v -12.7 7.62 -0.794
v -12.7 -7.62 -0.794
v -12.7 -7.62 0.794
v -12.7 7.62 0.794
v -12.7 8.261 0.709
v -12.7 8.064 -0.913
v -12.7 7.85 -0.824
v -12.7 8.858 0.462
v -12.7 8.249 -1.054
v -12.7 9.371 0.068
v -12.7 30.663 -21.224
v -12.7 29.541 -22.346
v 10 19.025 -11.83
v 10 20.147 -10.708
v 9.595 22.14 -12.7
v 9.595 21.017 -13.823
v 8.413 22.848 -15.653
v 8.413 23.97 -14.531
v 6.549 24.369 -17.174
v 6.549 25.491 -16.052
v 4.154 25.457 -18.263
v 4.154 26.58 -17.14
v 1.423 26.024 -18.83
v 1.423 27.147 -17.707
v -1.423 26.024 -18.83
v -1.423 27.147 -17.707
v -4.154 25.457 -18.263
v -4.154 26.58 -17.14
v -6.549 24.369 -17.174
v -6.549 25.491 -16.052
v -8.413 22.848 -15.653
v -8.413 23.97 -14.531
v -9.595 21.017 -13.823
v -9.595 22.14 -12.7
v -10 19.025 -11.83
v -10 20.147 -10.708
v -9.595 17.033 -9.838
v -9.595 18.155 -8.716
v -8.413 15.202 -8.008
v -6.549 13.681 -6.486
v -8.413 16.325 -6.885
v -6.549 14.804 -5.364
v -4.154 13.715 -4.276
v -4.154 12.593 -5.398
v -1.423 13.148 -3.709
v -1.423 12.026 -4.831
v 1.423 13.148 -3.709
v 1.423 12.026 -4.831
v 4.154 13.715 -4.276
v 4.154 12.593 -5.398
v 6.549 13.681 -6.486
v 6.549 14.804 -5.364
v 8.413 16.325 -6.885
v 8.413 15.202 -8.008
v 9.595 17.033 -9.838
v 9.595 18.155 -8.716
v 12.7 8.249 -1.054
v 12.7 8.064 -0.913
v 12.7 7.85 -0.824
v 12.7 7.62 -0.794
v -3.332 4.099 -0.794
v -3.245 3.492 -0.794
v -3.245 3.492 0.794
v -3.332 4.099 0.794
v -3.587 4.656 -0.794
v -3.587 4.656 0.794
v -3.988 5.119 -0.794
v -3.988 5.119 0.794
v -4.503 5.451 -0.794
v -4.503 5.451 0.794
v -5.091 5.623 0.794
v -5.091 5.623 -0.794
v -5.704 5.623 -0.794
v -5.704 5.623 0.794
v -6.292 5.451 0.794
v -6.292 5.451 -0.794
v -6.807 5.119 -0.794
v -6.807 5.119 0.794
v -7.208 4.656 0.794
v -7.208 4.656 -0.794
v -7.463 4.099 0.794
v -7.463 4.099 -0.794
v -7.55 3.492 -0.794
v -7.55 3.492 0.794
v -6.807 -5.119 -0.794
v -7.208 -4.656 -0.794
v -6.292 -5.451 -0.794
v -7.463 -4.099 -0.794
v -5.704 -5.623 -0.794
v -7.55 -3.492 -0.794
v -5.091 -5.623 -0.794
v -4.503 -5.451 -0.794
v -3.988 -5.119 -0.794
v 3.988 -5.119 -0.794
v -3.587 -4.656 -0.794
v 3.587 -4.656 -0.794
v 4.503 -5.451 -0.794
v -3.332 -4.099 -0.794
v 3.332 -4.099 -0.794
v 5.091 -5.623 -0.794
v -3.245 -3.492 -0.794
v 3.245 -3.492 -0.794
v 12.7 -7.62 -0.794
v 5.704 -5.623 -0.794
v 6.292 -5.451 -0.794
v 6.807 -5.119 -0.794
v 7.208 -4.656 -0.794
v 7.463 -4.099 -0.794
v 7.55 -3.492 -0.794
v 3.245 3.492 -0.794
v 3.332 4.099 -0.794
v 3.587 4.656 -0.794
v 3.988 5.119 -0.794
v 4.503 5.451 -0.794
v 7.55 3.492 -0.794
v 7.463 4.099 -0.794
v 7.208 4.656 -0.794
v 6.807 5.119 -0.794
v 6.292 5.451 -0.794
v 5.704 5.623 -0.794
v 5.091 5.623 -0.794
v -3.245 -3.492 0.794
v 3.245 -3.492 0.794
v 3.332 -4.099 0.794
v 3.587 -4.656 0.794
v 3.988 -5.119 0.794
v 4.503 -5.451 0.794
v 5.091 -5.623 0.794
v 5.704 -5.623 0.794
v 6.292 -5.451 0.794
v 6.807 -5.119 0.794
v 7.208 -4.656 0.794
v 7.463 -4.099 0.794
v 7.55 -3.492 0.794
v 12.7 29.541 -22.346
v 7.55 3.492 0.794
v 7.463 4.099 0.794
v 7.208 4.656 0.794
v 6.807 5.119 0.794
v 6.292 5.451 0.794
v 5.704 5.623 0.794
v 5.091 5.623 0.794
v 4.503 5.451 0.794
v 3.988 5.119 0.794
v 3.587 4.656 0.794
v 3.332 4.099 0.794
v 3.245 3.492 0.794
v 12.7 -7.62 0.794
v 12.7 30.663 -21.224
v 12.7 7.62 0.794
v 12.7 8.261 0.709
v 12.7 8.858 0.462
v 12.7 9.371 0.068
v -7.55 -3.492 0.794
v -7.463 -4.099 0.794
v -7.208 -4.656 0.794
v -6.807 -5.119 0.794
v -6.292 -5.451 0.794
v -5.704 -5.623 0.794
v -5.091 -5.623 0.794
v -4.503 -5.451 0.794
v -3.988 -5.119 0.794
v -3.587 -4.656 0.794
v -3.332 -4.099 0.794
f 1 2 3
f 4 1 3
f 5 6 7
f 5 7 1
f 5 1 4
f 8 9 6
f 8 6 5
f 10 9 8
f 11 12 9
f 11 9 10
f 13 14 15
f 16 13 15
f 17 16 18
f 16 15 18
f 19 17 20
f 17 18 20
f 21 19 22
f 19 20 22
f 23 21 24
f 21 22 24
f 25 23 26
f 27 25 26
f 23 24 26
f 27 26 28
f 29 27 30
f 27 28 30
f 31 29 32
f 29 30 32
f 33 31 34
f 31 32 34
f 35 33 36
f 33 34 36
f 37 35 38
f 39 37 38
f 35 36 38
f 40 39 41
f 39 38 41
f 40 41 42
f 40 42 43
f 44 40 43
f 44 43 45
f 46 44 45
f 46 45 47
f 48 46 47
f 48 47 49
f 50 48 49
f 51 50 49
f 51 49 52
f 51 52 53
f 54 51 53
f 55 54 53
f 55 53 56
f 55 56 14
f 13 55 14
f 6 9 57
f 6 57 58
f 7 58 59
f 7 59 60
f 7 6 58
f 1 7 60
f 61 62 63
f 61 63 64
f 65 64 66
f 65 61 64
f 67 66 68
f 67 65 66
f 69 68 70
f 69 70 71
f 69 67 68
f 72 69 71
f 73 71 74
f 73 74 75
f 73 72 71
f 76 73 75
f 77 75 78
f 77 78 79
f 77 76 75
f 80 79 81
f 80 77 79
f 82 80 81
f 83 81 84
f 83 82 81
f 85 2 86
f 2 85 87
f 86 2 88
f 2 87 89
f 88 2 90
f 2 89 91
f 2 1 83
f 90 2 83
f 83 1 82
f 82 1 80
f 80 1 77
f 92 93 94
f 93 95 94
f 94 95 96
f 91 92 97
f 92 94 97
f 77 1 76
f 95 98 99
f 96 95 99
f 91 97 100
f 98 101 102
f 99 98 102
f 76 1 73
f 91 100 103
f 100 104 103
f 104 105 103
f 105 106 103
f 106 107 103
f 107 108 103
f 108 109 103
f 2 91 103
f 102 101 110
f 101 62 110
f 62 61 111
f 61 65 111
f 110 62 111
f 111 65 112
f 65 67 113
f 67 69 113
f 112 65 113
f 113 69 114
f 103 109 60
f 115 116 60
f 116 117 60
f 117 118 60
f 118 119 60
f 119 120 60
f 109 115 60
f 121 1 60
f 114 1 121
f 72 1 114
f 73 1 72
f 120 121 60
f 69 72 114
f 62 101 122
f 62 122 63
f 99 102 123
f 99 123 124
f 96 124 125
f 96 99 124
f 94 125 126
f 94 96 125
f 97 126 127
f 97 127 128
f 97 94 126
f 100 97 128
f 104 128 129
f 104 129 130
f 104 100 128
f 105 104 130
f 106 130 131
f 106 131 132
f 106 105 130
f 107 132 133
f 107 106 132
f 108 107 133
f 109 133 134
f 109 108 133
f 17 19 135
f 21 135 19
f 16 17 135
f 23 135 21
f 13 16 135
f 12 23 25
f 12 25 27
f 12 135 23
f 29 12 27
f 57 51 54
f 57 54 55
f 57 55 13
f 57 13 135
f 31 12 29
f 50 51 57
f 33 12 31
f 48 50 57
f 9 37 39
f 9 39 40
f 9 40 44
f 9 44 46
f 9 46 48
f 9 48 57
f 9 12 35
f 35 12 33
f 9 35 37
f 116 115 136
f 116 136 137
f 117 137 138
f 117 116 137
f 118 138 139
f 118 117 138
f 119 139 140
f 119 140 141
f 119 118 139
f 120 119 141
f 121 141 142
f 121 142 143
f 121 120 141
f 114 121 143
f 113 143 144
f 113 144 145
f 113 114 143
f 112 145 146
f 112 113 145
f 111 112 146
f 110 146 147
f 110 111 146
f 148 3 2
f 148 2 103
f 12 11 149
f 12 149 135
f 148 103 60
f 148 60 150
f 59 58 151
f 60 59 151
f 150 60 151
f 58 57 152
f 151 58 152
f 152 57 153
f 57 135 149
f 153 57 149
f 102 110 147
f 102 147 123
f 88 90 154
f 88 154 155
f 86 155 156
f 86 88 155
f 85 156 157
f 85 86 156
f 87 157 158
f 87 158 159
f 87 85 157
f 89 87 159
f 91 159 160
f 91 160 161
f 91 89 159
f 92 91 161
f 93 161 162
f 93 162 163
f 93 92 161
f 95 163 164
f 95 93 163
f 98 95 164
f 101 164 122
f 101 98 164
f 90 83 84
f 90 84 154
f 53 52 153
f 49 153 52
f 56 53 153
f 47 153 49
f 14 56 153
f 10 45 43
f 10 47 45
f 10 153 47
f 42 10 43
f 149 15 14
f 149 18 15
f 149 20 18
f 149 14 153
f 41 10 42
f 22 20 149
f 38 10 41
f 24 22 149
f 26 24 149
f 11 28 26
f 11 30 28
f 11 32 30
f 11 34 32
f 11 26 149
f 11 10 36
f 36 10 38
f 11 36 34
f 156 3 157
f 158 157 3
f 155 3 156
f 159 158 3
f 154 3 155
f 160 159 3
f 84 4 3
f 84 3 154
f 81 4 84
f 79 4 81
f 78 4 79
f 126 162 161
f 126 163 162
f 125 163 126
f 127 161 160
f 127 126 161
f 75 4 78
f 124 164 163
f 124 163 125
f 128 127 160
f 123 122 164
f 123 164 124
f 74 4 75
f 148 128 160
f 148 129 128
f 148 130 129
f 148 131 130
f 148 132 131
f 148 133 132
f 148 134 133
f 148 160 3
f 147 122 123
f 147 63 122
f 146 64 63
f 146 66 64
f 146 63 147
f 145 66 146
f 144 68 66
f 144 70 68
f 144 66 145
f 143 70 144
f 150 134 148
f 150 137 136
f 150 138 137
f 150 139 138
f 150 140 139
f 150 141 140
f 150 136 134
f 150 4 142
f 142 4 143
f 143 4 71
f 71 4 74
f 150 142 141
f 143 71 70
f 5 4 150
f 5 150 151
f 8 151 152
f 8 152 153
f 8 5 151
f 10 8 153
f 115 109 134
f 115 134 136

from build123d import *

# Parameters (mm, degrees)
SKETCH1_W                 = 25.4
SKETCH1_H                 = 15.24
BOSS_EXTRUDE1_DEPTH       = 0.79375
EDGE_FLANGE1_DEPTH        = 25.4
F_6_START                 = -0.79375
F_6_CLEARANCE_SLOT1_DEPTH = 1.5875
M18_CLEARANCE_HOLE1_D     = 20
M18_CLEARANCE_HOLE1_DEPTH = 9.652
M18_CLEARANCE_HOLE1_TIP   = 6.00860619


# Read off the part's stored shape, not the designer's step: #6 Clearance Slot1
# Sheet-metal steps are written as plain solids
with BuildPart() as part:
    # Sketch1 → Boss-Extrude1 (new, symmetric)
    with BuildSketch(Plane.XY):
        Rectangle(SKETCH1_W, SKETCH1_H)
    extrude(amount=BOSS_EXTRUDE1_DEPTH, both=True)

    # Edge-Flange1 section (across the edge) → Edge-Flange1 (add)
    with BuildSketch(Plane(origin=(-12.7, 7.988235857, -0.79375), x_dir=(0, -0.7071067811865438, -0.7071067811865512), z_dir=(1, 0, 0))):
        with BuildLine():
            Line((-1.5875, 0.368235857), (-1.5875, 30.48))
            Line((-1.5875, 30.48), (0, 30.48))
            Line((0, 30.48), (0, 0.368235857))
            ThreePointArc((0, 0.368235857), (0.067671096, 0.028030286), (0.260382072, -0.260382072))
            Line((0.260382072, -0.260382072), (-0.862149944, -1.382914087))
            ThreePointArc((-0.862149944, -1.382914087), (-1.398987662, -0.579479663), (-1.5875, 0.368235857))
        make_face()
    extrude(amount=EDGE_FLANGE1_DEPTH)

    # #6 Clearance Slot1 outline → #6 Clearance Slot1 (cut)
    with BuildSketch(Plane.XY.offset(F_6_START)):
        with BuildLine():
            ThreePointArc((-3.24485, 3.4925), (-5.3975, 5.64515), (-7.55015, 3.4925))
            Line((-7.55015, 3.4925), (-7.55015, -3.4925))
            ThreePointArc((-7.55015, -3.4925), (-5.3975, -5.64515), (-3.24485, -3.4925))
            Line((-3.24485, -3.4925), (-3.24485, 3.4925))
        make_face()
        with BuildLine():
            ThreePointArc((3.24485, -3.4925), (5.3975, -5.64515), (7.55015, -3.4925))
            Line((7.55015, -3.4925), (7.55015, 3.4925))
            ThreePointArc((7.55015, 3.4925), (5.3975, 5.64515), (3.24485, 3.4925))
            Line((3.24485, 3.4925), (3.24485, -3.4925))
        make_face()
    extrude(amount=F_6_CLEARANCE_SLOT1_DEPTH, mode=Mode.SUBTRACT)

    # M18 Clearance Hole1
    with Locations(Plane(origin=(0, 3.597242928, 3.597242928), x_dir=(-1, 0, 0), z_dir=(0, -0.7071067811865438, -0.7071067811865512))):
        with Locations((0, 21.818037609)):
            Hole(M18_CLEARANCE_HOLE1_D / 2, depth=M18_CLEARANCE_HOLE1_DEPTH)
            with Locations((0, 0, -(M18_CLEARANCE_HOLE1_DEPTH + M18_CLEARANCE_HOLE1_TIP / 2))):  # 118° drill point
                Cone(0, M18_CLEARANCE_HOLE1_D / 2, M18_CLEARANCE_HOLE1_TIP, mode=Mode.SUBTRACT)


solid = part.part
